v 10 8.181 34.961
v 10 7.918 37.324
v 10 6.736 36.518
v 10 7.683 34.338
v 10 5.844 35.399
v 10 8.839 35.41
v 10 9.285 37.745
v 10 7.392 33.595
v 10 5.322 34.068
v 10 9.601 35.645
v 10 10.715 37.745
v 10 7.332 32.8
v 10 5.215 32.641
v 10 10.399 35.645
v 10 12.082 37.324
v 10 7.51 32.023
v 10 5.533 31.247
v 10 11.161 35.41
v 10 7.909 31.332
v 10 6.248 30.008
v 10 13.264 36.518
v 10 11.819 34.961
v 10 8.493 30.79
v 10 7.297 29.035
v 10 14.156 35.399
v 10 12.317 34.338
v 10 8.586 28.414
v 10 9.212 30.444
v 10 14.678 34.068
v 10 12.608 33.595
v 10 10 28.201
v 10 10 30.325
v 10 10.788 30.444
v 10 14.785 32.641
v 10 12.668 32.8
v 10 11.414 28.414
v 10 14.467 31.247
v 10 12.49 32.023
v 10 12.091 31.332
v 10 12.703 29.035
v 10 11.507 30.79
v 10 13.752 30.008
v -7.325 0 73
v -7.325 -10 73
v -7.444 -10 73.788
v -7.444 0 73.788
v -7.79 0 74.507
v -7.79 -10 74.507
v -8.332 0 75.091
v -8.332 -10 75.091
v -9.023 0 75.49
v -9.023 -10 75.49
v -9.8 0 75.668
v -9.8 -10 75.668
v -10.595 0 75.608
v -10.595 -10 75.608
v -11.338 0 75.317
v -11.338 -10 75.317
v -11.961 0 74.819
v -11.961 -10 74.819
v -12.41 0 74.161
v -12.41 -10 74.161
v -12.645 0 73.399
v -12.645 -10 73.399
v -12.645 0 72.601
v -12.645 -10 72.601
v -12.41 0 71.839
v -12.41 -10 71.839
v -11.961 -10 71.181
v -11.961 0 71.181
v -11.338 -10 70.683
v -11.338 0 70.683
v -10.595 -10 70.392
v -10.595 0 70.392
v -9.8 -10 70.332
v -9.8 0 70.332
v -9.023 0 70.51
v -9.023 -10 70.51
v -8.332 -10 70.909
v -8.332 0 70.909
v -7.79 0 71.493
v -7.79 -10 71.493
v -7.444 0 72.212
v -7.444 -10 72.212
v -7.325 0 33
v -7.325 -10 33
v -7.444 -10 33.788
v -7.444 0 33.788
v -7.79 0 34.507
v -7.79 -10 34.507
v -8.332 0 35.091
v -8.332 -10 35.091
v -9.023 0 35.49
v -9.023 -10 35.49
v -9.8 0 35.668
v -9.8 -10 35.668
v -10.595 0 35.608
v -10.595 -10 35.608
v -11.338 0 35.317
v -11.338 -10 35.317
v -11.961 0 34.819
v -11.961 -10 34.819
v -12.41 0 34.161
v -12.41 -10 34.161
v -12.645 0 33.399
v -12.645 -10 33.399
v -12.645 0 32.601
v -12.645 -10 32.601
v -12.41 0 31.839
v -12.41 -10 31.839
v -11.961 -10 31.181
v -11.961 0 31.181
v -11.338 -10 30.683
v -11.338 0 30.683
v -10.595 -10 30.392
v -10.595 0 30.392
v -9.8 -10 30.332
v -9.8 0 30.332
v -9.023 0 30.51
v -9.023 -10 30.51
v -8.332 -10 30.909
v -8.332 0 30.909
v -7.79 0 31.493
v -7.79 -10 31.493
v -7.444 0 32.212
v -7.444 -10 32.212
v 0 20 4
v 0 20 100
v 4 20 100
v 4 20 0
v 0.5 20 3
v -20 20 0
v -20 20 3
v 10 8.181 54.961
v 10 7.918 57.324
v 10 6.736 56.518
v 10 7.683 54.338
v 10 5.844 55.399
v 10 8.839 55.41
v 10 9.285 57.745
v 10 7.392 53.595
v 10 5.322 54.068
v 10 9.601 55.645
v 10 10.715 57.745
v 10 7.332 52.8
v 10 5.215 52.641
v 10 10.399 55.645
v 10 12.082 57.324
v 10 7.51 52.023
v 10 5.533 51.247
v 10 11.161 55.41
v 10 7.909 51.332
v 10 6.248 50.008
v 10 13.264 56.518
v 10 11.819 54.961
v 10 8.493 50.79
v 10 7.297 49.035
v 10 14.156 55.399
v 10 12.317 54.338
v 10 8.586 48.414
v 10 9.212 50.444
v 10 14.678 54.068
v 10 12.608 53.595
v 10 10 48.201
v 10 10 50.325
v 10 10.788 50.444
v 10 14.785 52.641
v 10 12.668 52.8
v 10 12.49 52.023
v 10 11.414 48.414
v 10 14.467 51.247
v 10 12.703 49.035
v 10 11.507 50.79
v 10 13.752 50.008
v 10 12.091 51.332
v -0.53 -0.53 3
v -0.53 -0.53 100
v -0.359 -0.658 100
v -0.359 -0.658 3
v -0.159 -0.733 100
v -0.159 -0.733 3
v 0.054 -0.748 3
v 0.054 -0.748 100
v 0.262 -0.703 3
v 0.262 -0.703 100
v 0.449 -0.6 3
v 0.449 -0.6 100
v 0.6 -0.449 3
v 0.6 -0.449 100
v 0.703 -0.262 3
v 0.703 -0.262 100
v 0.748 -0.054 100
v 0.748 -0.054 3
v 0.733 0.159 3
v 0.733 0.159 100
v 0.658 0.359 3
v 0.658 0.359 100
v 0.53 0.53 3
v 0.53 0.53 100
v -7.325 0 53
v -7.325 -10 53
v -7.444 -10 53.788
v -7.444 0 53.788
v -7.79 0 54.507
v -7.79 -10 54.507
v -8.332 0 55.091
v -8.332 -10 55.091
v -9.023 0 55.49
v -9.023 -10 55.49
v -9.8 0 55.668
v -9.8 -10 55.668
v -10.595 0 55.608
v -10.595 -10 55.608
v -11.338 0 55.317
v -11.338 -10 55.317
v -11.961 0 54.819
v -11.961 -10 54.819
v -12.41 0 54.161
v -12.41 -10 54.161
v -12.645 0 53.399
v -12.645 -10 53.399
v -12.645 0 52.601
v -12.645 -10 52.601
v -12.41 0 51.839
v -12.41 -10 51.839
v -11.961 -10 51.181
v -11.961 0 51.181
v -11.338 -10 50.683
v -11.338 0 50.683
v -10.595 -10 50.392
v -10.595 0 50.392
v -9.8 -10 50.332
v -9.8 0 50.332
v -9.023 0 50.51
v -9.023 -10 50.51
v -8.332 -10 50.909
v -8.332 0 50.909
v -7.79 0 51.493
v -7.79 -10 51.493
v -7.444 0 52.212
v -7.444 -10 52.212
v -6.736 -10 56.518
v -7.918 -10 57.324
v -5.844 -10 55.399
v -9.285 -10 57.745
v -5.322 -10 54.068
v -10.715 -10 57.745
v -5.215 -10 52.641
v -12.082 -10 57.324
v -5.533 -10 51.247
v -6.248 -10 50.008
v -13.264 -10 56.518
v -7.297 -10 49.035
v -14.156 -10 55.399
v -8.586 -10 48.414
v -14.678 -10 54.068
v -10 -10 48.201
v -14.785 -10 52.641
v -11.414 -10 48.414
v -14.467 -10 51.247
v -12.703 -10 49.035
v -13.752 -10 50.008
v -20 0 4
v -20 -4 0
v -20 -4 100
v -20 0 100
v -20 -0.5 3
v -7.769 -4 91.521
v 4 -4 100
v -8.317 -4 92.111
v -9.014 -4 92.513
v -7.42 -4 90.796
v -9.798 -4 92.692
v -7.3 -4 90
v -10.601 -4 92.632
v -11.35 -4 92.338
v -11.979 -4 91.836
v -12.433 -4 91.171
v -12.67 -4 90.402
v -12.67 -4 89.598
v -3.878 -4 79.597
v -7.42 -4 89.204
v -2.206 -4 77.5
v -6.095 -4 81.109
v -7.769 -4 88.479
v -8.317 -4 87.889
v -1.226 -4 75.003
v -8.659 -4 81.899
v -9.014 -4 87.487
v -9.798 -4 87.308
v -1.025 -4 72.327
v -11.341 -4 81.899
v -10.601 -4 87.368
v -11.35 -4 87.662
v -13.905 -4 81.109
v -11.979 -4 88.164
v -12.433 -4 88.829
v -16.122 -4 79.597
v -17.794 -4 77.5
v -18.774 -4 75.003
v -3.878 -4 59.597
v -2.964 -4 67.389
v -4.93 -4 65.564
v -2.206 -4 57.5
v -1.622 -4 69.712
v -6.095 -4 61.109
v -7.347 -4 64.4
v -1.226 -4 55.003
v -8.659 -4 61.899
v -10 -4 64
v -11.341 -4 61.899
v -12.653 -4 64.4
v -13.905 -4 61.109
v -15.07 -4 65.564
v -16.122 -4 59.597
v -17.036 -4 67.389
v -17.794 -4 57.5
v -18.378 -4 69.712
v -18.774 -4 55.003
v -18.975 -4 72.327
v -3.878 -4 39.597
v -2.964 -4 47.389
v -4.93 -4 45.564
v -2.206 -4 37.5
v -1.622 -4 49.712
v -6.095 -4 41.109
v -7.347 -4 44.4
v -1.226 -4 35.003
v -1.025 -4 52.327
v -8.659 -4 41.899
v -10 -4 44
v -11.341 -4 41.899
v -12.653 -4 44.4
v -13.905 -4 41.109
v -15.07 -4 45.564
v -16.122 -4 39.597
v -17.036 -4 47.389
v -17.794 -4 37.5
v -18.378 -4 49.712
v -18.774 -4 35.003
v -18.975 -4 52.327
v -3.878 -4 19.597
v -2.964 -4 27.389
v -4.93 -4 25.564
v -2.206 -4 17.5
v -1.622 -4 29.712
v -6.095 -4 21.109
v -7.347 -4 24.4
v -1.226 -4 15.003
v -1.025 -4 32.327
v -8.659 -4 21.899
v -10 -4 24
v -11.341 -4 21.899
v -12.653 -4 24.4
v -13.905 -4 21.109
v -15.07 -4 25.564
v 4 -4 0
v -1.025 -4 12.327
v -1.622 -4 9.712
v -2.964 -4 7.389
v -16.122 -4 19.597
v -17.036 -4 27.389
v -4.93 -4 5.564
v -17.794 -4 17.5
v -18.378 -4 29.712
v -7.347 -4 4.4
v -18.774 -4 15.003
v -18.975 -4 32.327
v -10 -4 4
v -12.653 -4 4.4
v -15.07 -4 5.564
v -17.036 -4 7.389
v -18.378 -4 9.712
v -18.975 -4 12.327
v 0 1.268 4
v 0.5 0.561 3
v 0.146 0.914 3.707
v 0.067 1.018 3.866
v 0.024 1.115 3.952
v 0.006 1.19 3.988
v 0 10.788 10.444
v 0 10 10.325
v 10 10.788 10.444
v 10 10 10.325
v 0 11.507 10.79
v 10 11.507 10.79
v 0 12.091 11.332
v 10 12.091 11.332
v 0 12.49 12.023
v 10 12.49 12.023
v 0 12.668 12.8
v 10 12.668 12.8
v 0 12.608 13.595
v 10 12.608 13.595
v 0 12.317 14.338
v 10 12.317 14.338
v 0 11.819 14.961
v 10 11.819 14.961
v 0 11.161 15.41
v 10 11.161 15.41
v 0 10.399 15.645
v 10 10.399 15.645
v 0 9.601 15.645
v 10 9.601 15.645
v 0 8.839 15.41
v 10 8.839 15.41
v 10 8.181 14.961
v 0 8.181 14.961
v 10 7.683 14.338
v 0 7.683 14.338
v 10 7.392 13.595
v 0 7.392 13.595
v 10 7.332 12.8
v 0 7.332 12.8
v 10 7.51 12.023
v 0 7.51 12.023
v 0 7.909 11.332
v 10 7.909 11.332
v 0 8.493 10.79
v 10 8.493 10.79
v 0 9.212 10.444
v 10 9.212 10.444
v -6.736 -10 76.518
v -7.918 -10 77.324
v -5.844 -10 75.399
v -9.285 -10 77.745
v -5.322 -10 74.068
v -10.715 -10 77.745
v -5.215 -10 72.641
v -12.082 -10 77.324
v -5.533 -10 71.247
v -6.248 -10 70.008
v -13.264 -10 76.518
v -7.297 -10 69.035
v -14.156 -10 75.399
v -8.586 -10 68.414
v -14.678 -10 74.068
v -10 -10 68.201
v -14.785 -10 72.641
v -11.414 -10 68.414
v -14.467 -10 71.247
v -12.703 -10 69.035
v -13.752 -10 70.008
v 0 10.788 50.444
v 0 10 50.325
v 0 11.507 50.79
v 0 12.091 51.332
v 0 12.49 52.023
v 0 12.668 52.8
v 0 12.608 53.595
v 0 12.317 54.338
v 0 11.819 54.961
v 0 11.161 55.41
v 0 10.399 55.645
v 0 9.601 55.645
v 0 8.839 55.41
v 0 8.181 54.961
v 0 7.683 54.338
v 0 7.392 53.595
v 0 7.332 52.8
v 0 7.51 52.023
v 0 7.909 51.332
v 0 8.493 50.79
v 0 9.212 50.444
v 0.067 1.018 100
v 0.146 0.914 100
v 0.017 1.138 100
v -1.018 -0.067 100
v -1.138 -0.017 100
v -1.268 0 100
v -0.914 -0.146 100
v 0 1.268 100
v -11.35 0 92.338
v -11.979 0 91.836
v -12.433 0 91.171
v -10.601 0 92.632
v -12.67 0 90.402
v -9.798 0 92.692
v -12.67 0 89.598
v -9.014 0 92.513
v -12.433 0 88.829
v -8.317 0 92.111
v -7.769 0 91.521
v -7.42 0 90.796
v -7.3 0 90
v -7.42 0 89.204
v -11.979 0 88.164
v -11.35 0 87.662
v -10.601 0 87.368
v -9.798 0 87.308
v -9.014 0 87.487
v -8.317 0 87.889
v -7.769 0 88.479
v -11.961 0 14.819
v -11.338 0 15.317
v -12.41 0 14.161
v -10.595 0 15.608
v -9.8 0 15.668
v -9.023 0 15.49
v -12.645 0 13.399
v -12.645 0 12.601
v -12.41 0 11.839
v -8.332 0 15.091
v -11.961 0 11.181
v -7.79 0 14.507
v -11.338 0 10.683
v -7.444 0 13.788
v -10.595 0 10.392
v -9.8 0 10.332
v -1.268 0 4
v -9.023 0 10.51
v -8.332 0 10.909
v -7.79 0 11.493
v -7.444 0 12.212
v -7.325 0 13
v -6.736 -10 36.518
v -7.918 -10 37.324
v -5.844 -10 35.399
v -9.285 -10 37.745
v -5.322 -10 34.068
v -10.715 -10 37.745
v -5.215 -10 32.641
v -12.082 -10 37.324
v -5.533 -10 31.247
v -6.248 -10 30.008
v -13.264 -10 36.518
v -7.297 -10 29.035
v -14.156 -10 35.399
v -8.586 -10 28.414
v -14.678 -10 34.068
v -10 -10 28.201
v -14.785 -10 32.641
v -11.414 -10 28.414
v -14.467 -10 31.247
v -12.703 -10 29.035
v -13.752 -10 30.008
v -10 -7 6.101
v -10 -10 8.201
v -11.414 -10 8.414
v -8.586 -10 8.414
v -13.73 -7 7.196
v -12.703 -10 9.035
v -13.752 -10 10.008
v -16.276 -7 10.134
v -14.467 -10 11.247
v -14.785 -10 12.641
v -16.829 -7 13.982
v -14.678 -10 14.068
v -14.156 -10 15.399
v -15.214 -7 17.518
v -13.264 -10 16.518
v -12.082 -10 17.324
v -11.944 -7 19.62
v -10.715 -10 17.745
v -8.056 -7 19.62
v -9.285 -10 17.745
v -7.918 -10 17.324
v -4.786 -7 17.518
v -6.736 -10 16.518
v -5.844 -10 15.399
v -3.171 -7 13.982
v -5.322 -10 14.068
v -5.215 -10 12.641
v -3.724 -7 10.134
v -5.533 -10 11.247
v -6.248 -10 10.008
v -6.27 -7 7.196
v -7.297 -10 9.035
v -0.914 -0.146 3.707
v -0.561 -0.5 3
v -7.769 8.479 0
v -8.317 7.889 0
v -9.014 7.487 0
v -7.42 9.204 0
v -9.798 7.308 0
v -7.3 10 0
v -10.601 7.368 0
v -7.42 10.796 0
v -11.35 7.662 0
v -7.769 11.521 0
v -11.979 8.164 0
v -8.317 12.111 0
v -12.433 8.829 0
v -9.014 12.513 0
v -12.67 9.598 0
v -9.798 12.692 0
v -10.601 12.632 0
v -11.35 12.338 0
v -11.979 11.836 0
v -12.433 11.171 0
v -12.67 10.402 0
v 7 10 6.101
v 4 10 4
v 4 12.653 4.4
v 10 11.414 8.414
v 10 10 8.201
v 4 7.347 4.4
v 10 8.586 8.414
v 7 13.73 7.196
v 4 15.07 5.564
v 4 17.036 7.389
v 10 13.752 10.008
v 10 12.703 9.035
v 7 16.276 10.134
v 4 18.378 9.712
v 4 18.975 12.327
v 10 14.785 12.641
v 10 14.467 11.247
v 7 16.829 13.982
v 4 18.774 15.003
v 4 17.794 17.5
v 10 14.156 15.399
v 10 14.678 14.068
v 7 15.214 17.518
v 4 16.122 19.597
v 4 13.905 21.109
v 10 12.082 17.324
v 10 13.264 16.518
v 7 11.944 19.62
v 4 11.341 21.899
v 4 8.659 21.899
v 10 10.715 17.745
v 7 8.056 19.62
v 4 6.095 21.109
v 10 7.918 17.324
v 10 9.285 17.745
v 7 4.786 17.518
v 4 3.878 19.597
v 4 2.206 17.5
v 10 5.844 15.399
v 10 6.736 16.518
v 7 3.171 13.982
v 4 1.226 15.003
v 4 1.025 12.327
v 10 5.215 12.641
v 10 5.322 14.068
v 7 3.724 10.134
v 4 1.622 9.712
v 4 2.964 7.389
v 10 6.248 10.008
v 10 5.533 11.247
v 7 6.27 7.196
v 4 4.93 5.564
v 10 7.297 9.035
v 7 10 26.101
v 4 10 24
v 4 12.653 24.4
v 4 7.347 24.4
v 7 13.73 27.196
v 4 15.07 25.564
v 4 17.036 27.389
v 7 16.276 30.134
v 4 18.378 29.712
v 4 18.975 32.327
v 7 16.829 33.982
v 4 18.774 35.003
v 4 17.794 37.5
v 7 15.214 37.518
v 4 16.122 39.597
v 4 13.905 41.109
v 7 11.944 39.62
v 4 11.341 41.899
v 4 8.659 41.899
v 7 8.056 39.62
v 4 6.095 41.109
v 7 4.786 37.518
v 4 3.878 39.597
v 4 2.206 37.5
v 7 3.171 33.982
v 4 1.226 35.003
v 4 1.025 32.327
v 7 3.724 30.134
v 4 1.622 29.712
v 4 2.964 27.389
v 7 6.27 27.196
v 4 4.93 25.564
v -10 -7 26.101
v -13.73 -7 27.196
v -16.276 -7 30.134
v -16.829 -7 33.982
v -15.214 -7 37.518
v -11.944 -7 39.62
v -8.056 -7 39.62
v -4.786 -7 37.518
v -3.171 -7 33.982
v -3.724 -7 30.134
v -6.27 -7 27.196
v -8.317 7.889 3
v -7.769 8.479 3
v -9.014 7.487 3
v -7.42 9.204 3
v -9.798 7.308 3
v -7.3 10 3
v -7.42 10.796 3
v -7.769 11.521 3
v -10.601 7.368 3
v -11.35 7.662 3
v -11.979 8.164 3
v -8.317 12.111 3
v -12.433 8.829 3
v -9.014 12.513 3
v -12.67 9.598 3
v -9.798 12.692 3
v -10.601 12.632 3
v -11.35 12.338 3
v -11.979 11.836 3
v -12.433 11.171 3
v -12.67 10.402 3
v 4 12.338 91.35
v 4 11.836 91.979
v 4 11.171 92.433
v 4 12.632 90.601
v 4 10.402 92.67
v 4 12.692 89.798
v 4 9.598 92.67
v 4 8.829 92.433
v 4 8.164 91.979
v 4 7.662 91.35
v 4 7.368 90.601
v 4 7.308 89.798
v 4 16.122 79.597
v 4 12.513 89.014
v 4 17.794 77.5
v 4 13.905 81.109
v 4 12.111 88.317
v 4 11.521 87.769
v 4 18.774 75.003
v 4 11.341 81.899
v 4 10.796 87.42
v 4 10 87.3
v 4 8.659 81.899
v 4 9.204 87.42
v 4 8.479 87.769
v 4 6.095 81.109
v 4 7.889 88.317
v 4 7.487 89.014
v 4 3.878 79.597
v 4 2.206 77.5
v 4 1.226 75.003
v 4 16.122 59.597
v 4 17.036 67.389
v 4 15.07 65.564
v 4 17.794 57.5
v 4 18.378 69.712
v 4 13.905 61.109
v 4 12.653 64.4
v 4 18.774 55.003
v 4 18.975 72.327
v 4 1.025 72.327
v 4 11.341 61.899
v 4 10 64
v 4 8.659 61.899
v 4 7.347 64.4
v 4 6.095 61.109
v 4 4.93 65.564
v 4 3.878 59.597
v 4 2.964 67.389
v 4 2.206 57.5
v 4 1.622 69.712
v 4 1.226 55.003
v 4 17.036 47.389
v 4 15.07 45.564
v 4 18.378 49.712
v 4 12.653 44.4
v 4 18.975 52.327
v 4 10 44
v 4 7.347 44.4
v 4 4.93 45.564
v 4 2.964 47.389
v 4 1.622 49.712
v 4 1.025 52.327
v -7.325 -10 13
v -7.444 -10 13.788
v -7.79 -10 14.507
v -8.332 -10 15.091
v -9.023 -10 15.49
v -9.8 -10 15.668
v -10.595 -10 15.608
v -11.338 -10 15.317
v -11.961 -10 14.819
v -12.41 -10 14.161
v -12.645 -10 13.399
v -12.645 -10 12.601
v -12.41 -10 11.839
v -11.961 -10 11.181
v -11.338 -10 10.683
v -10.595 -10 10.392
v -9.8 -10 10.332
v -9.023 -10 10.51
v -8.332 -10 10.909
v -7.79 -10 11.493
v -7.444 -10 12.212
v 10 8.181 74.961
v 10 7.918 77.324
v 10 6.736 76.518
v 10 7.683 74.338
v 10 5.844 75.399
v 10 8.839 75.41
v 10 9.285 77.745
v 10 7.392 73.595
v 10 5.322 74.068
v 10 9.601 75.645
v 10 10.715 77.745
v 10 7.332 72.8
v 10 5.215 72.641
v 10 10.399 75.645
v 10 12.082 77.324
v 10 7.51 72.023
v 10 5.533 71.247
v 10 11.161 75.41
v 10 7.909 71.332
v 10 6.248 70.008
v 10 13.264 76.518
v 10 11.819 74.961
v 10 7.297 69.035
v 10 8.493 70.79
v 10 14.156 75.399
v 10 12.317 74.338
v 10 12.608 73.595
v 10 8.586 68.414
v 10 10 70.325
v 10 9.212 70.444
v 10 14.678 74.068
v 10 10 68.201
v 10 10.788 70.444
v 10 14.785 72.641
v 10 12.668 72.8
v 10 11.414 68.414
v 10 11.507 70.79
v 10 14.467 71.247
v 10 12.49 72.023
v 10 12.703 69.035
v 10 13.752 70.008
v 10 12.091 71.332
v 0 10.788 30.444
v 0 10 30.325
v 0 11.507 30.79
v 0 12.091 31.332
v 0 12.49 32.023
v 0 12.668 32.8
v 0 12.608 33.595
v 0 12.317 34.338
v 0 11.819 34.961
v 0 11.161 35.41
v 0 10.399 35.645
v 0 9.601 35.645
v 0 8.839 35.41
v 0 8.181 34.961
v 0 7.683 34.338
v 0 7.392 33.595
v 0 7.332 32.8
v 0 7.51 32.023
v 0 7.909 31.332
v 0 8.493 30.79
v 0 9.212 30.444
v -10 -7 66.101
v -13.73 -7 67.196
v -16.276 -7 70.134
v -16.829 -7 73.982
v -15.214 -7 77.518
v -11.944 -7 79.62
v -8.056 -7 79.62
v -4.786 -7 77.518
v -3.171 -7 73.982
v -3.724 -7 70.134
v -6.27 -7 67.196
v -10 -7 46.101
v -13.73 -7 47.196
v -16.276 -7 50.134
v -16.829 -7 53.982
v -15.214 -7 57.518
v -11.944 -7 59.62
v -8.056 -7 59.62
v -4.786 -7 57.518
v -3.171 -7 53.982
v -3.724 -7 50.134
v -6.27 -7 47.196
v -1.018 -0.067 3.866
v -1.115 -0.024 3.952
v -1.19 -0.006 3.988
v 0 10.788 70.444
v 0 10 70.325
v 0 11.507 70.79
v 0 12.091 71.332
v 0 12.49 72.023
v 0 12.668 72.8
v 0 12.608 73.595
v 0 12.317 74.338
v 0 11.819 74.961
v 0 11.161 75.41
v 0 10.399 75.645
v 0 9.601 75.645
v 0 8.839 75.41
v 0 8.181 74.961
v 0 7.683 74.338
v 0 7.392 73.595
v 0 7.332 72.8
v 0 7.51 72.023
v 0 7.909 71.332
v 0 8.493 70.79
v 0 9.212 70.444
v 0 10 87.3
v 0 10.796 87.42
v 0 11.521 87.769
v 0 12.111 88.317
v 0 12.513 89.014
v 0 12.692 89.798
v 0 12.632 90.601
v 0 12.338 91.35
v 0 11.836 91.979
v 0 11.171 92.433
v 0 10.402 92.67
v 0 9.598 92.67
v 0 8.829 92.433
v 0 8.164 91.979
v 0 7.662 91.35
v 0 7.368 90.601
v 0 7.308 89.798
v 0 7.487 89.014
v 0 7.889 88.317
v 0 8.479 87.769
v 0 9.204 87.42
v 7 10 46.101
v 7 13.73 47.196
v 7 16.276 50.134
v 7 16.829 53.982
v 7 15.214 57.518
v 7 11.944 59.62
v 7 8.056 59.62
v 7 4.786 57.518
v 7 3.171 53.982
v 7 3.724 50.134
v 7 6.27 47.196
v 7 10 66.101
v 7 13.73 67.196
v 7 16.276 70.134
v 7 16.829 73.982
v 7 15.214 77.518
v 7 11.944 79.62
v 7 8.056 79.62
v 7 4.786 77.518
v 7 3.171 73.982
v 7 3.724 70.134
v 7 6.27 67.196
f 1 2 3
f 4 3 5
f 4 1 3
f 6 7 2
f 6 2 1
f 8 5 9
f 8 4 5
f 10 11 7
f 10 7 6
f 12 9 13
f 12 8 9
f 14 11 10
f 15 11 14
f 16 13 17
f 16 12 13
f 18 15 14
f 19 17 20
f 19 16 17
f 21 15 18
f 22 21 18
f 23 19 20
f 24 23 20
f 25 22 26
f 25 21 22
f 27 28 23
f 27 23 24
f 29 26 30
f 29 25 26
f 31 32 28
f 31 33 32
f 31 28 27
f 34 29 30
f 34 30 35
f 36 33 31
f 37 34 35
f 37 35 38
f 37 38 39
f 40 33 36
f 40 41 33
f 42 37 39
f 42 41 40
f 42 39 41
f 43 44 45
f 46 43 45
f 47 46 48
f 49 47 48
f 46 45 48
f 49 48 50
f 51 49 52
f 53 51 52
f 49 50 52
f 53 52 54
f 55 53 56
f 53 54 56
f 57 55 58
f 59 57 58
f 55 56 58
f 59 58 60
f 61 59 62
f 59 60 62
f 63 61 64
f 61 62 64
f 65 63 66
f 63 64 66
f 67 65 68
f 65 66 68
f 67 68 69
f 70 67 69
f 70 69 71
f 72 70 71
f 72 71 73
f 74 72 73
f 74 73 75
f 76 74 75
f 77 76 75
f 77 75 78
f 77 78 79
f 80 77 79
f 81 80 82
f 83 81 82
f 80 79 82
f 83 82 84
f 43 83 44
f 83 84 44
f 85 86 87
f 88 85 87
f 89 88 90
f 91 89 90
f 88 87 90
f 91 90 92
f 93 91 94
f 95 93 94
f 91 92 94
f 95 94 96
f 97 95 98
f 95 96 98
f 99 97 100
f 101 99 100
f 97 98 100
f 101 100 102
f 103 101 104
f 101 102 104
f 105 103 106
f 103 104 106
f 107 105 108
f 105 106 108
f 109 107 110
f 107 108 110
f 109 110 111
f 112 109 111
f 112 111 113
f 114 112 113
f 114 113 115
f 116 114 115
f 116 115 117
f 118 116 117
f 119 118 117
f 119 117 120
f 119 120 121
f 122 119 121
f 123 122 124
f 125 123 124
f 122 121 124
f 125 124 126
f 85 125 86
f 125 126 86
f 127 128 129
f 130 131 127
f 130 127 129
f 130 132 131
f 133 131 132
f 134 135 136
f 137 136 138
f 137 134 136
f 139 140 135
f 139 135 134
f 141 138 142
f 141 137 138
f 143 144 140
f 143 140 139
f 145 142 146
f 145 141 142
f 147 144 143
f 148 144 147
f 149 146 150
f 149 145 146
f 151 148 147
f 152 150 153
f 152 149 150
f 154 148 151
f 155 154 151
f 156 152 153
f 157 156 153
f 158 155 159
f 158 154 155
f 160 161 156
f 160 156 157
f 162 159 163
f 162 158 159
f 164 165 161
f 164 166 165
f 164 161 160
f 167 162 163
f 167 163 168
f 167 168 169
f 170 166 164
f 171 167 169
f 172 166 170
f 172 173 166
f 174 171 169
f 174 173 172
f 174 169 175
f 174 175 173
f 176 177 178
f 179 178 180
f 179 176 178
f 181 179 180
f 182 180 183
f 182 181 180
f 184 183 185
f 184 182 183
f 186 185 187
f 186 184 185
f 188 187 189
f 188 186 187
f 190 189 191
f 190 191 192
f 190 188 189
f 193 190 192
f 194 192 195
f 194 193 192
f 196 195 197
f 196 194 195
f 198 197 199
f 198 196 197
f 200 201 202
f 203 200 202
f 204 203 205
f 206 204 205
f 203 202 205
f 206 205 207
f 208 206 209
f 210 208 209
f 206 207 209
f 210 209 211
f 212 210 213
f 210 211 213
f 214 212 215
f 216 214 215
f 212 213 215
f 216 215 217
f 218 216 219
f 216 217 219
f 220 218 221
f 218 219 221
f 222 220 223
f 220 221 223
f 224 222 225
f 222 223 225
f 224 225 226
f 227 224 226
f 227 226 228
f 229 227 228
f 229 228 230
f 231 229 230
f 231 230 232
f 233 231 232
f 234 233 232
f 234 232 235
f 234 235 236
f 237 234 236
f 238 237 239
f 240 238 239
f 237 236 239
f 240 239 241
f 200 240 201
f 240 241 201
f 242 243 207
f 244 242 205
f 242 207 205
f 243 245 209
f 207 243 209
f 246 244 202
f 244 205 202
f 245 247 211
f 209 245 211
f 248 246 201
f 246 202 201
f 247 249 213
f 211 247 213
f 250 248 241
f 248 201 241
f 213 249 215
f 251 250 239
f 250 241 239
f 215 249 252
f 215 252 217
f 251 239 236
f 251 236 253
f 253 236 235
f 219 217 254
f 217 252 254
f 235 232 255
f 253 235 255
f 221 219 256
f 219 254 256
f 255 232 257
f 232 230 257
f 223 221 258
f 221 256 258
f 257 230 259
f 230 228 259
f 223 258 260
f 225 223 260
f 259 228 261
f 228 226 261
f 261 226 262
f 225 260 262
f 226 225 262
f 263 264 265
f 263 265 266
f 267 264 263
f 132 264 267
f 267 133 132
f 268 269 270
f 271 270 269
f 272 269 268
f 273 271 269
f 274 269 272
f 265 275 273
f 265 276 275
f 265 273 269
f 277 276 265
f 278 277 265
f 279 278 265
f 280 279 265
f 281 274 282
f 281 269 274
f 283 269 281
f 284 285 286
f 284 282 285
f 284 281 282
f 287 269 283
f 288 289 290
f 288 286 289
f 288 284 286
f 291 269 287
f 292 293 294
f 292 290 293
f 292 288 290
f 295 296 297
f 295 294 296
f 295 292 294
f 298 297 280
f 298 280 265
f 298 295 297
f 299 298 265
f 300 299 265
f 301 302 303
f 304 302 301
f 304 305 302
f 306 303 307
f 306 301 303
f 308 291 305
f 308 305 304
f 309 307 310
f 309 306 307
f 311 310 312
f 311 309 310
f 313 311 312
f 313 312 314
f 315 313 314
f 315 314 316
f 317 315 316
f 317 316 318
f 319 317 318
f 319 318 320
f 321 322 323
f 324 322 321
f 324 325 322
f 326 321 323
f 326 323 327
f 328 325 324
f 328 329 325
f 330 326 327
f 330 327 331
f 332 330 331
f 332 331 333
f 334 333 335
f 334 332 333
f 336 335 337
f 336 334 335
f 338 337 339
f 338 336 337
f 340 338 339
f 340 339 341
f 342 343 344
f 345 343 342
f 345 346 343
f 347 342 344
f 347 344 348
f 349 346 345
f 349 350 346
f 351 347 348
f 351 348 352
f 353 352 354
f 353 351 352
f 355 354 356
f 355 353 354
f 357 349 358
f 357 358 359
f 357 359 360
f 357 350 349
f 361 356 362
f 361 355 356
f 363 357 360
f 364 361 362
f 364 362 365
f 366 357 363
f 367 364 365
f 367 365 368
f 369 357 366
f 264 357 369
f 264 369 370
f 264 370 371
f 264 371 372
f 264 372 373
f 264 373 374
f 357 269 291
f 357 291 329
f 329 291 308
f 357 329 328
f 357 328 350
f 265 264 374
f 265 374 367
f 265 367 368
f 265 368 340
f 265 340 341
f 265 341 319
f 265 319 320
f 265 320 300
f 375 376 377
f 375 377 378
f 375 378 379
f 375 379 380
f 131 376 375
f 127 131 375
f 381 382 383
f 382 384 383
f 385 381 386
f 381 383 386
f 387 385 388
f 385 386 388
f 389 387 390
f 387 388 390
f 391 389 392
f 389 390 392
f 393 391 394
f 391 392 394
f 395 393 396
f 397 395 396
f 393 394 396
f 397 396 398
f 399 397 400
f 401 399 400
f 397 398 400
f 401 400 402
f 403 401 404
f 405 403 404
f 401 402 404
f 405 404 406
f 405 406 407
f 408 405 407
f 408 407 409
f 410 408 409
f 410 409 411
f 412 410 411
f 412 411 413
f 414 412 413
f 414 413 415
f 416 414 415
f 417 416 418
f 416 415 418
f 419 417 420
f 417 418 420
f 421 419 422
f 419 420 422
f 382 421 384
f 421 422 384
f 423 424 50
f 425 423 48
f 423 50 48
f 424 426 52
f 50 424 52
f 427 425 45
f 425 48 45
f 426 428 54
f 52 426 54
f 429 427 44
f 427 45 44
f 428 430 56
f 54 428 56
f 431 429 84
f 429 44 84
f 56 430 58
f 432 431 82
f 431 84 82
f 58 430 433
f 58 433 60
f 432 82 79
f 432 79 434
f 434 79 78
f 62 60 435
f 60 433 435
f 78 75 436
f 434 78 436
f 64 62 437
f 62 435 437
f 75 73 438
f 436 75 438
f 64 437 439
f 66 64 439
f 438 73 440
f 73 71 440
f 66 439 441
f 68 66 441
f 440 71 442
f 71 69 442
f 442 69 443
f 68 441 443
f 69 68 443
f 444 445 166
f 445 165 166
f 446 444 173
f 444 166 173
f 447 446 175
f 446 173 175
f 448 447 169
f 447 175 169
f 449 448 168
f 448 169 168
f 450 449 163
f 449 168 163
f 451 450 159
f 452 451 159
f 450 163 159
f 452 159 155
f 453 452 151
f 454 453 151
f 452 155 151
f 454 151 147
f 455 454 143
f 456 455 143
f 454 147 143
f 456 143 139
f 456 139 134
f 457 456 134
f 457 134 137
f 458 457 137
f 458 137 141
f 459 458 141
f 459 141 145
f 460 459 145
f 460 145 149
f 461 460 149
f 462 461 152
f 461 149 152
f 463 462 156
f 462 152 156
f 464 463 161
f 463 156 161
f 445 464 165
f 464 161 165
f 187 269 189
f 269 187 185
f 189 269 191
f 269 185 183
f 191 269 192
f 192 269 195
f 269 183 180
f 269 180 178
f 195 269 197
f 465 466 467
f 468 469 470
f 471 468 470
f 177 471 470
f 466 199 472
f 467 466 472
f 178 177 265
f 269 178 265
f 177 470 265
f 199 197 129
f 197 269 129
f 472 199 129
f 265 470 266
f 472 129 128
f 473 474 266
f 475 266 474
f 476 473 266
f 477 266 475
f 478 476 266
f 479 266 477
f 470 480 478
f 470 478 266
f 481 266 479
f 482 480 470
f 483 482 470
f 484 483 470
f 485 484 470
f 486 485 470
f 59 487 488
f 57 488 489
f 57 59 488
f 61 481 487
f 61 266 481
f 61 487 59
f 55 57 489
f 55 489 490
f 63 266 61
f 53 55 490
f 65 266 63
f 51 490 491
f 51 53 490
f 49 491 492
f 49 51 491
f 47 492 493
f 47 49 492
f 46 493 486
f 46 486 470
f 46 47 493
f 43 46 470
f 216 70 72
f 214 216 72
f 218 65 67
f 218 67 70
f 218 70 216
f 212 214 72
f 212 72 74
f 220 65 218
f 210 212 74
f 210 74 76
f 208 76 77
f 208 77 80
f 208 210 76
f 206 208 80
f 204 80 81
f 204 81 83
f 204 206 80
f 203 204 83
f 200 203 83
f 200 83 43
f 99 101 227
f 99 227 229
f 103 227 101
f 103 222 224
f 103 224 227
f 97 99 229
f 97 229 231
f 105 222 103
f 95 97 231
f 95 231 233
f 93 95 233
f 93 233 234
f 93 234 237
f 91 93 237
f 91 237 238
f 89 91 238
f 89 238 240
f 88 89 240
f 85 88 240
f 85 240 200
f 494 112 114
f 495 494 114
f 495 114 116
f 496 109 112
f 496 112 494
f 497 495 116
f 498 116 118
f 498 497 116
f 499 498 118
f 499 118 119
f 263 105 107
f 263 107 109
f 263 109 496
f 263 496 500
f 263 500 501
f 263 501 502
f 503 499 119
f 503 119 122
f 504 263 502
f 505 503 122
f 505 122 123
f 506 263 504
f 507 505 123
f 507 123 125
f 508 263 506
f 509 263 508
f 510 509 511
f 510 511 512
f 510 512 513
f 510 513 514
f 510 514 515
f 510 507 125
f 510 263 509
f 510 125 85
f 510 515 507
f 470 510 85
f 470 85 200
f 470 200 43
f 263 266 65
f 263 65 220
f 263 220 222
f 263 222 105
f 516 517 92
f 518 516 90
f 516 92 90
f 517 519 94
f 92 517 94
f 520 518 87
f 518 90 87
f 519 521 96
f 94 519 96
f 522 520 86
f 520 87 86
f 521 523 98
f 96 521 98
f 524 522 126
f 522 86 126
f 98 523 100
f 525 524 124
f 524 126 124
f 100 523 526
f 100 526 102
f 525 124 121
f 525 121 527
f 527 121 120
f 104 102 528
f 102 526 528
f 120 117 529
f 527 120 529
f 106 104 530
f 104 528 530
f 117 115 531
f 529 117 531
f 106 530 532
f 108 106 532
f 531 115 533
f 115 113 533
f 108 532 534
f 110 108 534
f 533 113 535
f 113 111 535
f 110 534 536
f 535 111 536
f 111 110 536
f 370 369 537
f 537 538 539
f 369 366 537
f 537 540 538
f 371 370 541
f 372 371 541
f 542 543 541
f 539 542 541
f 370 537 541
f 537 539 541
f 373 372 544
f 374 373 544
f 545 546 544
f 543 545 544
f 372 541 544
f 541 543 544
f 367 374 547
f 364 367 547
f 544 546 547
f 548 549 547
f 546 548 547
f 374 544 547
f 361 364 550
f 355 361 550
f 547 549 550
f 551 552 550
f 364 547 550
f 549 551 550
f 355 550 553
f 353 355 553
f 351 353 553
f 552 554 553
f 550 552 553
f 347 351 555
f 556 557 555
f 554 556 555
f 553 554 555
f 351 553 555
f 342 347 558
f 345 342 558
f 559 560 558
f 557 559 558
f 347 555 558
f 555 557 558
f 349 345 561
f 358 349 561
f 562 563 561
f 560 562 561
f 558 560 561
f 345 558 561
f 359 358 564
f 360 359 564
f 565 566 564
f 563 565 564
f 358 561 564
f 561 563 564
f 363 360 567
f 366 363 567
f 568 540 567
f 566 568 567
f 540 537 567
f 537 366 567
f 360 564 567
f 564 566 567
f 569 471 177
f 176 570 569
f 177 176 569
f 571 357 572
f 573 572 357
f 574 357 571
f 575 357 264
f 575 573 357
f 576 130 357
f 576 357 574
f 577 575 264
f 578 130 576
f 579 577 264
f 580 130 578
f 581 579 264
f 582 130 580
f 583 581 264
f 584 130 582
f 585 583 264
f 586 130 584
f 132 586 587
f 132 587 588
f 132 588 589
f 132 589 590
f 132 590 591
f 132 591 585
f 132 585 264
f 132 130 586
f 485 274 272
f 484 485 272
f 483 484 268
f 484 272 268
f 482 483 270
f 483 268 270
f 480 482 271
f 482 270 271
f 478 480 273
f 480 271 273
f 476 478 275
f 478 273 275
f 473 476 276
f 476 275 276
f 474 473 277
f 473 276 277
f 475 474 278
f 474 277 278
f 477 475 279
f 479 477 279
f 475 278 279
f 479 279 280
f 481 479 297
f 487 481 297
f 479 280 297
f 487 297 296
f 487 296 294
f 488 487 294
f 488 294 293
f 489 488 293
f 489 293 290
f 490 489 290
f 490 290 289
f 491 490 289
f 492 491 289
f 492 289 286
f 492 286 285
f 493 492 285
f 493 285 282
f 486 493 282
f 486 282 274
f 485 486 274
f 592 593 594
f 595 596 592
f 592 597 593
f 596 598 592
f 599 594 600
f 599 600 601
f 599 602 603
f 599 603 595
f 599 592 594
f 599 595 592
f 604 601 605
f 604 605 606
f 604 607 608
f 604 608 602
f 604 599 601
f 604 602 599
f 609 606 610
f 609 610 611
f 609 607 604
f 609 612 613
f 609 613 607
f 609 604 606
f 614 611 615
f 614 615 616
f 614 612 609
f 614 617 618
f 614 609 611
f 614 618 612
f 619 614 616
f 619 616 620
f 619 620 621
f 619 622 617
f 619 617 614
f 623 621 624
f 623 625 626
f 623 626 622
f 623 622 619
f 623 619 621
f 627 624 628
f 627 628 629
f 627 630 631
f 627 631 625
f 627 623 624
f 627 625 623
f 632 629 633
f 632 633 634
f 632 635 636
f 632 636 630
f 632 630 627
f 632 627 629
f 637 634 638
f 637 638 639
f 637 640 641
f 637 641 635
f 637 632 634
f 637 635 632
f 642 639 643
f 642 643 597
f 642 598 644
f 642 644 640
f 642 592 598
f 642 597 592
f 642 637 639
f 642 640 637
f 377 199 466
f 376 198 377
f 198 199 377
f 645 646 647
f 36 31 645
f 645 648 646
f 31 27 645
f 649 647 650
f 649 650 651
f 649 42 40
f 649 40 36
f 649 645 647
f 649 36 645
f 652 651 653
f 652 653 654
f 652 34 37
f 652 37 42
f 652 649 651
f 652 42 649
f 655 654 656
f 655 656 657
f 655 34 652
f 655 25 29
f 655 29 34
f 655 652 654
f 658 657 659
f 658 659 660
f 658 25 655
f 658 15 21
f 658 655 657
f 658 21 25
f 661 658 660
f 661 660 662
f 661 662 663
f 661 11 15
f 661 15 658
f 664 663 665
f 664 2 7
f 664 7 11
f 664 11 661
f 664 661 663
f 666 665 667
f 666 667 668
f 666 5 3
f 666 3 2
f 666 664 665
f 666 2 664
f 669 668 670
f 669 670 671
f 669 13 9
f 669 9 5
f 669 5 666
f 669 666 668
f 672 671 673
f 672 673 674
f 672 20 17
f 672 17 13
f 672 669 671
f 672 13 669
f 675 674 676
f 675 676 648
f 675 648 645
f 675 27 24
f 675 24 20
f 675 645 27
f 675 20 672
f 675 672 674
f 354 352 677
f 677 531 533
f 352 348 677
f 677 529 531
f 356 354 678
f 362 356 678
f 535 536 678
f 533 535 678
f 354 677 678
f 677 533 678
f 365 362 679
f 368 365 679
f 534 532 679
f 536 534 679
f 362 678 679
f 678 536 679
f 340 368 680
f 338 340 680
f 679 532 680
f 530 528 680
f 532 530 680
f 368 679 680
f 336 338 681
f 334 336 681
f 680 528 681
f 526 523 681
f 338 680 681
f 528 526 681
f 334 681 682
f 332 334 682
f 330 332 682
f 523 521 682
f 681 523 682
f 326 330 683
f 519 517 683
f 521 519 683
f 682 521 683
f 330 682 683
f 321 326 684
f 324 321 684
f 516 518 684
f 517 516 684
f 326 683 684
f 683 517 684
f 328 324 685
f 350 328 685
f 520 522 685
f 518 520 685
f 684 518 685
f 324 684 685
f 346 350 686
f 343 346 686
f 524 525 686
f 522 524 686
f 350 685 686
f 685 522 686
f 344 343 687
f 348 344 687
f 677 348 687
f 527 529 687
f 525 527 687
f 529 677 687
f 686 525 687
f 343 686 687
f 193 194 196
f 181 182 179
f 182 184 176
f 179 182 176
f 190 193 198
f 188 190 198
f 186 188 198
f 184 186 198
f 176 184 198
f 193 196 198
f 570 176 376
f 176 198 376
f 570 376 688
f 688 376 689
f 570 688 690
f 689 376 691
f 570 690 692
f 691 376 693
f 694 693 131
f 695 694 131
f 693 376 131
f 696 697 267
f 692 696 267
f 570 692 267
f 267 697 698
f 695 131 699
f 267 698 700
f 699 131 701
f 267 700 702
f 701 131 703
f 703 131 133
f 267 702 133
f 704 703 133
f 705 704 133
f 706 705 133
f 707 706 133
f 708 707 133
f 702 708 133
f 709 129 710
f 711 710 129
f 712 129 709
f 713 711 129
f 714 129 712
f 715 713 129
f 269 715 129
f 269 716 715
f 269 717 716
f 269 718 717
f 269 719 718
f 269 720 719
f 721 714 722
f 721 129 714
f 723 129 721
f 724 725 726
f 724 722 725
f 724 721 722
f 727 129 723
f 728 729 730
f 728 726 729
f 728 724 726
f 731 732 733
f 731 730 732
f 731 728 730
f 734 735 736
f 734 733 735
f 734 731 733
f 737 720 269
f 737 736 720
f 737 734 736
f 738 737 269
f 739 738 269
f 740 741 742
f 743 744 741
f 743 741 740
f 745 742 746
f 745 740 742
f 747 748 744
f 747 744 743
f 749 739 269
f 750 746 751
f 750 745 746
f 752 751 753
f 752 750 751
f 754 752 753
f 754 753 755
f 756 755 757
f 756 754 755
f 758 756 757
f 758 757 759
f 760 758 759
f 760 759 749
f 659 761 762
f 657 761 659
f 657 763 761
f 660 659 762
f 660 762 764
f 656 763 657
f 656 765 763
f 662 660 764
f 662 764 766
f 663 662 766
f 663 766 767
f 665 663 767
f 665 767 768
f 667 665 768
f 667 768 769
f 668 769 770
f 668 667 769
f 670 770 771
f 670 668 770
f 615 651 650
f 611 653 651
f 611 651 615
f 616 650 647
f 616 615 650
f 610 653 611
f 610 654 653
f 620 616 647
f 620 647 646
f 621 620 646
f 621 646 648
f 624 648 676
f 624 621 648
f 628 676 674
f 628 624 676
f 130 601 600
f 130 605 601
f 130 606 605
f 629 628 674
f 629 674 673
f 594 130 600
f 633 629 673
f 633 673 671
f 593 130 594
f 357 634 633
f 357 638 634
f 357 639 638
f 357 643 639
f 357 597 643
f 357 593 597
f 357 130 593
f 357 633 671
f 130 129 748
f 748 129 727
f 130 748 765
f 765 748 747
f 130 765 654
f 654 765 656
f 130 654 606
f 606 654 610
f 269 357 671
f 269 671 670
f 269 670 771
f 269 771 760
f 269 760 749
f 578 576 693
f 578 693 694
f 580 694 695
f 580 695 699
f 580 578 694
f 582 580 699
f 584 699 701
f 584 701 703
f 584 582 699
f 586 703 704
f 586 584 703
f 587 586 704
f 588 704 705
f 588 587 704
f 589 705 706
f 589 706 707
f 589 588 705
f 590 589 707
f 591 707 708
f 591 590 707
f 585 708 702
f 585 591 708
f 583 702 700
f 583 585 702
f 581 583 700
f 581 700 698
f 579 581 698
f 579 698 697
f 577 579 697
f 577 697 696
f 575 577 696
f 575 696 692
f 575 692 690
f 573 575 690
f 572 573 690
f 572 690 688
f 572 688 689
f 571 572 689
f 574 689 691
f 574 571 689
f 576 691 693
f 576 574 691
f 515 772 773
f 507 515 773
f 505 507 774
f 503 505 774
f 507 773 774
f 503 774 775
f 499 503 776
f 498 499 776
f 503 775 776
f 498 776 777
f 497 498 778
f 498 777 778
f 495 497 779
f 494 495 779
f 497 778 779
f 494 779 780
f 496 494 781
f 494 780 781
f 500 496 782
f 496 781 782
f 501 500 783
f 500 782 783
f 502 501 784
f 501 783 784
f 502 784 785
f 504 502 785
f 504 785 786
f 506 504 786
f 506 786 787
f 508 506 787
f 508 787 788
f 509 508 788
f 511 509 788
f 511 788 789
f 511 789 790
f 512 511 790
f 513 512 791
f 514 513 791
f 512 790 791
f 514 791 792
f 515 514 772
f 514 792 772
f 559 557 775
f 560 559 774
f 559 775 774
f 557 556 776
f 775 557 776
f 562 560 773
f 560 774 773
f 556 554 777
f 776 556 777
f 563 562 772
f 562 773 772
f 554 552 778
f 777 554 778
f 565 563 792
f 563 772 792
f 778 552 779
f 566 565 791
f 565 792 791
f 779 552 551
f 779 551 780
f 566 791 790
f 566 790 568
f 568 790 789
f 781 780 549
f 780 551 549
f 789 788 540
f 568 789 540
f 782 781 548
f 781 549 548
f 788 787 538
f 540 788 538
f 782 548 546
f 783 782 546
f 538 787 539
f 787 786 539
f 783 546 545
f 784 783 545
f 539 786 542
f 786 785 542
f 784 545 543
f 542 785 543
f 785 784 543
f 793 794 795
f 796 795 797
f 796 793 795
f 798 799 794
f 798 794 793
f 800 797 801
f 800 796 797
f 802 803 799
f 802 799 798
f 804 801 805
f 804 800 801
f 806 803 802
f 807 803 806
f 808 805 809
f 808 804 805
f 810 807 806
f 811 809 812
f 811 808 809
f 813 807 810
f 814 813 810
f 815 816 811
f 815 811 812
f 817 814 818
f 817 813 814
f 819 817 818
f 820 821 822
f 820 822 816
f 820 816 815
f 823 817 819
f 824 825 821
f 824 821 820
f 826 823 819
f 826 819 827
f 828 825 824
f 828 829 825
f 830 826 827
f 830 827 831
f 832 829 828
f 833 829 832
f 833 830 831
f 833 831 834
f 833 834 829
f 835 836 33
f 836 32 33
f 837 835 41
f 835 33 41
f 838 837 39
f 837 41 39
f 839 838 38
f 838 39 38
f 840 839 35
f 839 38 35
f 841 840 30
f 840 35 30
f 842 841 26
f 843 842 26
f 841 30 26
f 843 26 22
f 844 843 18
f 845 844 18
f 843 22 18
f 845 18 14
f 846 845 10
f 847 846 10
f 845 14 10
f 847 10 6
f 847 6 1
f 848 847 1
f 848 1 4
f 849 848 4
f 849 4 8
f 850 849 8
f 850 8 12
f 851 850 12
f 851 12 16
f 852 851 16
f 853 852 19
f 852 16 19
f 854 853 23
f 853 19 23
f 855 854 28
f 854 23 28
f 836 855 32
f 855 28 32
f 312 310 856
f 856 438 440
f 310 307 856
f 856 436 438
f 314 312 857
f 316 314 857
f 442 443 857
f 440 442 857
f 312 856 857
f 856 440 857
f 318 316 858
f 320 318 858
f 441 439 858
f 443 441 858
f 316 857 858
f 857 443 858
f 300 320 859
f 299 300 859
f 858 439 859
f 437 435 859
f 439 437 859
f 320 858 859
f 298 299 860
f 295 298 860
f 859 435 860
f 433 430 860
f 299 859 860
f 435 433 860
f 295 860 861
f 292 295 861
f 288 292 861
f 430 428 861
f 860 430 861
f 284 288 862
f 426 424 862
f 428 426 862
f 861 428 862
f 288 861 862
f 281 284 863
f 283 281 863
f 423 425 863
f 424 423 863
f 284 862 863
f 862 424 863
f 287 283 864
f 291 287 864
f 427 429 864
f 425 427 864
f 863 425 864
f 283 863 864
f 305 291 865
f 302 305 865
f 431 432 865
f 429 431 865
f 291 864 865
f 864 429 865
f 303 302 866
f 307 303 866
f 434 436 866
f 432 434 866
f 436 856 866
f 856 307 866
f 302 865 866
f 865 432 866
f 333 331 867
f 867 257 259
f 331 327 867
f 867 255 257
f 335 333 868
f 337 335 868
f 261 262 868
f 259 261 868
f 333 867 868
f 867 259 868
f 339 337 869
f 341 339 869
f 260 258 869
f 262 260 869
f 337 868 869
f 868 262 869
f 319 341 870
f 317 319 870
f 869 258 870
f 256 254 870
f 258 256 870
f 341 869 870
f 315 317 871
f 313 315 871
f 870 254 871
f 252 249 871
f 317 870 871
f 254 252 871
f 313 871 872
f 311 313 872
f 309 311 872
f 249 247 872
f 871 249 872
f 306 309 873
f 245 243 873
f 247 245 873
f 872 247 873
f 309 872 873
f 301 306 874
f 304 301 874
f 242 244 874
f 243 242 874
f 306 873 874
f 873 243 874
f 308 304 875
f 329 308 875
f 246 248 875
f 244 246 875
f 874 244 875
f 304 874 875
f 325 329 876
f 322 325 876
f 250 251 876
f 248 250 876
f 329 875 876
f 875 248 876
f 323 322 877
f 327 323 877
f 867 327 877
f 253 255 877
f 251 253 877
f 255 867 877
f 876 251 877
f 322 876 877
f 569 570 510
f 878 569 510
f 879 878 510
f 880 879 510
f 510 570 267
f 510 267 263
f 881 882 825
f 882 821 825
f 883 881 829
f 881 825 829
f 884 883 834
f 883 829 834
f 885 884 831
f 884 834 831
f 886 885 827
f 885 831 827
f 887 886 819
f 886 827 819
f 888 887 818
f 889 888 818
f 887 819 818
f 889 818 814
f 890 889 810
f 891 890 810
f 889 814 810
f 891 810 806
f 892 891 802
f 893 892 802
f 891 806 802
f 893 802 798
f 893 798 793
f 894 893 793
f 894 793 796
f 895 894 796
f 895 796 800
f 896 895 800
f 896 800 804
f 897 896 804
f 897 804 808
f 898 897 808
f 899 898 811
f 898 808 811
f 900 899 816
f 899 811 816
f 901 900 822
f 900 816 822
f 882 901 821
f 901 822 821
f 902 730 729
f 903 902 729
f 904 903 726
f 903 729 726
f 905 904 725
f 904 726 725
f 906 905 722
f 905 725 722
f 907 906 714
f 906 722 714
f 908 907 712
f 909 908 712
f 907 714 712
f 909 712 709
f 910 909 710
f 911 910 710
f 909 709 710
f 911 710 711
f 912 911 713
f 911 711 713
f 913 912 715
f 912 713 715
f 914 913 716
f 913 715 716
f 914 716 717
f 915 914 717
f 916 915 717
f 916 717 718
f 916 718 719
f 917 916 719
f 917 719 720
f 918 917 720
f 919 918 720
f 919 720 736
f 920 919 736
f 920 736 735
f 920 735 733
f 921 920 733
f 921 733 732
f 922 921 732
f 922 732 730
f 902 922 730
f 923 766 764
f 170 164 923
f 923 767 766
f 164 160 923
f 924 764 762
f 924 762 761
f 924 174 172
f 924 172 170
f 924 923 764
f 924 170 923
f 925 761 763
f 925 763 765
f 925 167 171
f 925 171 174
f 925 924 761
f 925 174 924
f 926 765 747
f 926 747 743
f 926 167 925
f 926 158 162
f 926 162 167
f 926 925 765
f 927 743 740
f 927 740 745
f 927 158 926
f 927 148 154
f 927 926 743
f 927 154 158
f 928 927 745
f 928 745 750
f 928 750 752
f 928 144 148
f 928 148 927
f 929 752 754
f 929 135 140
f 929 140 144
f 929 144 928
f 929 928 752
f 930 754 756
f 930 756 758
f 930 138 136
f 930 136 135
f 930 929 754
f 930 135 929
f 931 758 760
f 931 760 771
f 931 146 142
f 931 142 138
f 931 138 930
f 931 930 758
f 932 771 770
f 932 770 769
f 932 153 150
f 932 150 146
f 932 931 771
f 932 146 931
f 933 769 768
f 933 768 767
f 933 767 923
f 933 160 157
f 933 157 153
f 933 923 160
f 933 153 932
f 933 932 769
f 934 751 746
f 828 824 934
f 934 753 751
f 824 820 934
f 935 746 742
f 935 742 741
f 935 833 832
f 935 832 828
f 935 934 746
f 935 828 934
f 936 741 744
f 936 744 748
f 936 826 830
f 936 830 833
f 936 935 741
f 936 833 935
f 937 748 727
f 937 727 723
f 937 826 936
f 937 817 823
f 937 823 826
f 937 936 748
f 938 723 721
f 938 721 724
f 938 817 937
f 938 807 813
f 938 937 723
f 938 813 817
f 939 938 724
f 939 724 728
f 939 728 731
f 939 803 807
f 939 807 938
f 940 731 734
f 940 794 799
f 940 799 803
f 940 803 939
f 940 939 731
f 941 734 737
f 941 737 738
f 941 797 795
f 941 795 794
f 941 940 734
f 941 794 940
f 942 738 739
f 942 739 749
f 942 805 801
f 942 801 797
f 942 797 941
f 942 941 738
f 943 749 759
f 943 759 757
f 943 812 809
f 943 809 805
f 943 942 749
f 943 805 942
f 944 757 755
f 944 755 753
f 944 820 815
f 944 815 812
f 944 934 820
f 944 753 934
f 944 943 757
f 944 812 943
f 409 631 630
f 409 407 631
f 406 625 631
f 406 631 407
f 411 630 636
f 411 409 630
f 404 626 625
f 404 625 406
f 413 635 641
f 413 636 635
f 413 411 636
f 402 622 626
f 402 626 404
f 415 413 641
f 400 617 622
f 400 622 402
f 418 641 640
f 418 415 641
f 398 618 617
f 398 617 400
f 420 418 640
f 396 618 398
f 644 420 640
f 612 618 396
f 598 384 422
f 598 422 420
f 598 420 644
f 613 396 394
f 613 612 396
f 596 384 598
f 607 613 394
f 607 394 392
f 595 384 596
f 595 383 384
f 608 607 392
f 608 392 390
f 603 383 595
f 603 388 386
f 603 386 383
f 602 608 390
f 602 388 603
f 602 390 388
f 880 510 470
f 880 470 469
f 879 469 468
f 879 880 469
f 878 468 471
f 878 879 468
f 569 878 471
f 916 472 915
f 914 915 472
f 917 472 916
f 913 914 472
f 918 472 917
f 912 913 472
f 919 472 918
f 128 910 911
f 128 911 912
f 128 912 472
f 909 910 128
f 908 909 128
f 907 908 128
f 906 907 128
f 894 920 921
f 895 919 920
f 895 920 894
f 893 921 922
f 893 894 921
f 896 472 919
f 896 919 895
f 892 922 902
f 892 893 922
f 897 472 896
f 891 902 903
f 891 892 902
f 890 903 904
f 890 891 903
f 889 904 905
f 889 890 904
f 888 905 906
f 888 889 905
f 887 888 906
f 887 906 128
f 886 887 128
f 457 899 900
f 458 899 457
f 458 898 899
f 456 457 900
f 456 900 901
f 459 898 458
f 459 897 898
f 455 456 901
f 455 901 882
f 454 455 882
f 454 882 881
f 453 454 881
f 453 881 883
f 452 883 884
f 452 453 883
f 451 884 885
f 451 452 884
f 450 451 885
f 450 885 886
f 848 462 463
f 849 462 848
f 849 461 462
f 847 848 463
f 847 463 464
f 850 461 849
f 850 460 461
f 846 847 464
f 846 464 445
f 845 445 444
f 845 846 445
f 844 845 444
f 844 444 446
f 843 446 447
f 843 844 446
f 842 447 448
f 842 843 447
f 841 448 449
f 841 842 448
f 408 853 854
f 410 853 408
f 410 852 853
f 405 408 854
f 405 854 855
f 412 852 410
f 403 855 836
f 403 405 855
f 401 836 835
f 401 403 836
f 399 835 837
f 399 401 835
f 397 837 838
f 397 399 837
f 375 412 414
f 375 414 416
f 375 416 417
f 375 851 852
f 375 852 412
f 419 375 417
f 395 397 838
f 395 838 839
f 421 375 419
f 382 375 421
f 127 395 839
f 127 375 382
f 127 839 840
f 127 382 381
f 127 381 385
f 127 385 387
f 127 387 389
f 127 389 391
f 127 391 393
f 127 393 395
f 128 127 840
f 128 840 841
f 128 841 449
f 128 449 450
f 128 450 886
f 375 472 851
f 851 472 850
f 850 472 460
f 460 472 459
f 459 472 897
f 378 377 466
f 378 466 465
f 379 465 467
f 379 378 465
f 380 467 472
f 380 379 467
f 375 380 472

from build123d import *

# Parameters (mm, degrees)
SKETCH1_R                      = 2.7
BOSS_EXTRUDE1_DEPTH            = 3
BOSS_EXTRUDE2_DEPTH            = 100
CUT_EXTRUDE1_DEPTH             = 20
CUT_EXTRUDE2_DEPTH             = 20
SKETCH4_R                      = 9
BOSS_EXTRUDE3_DEPTH            = 6
BOSS_EXTRUDE3_TAPER            = 35
CUT_EXTRUDE3_REACH             = 26
SKETCH4_3_R                    = 2.675
SKETCH4_3_R_2                  = 2.7
CUT_EXTRUDE3_DIRECTION_2_REACH = 8
SKETCH5_R                      = 2.675
SKETCH5_R_2                    = 2.7
CUT_EXTRUDE4_DEPTH             = 10


with BuildPart() as part:
    # Sketch1 → Boss-Extrude1 (new body)
    with BuildSketch(Plane.XY):
        with BuildLine():
            Line((-1.267766953, 0), (-20, 0))
            Line((-20, 0), (-20, 20))
            Line((-20, 20), (0, 20))
            Line((0, 20), (0, 1.267766953))
            ThreePointArc((0, 1.267766953), (0.038060234, 1.076425237), (0.146446609, 0.914213562))
            Line((0.146446609, 0.914213562), (0.530330086, 0.530330086))
            ThreePointArc((0.530330086, 0.530330086), (0.530330086, -0.530330086), (-0.530330086, -0.530330086))
            Line((-0.530330086, -0.530330086), (-0.914213562, -0.146446609))
            ThreePointArc((-0.914213562, -0.146446609), (-1.076425237, -0.038060234), (-1.267766953, 0))
        make_face()
        with Locations((-10, 10)):
            Circle(SKETCH1_R, mode=Mode.SUBTRACT)
    extrude(amount=BOSS_EXTRUDE1_DEPTH)

    # Sketch1<4> → Boss-Extrude2 (add)
    with BuildSketch(Plane.XY):
        with BuildLine():
            ThreePointArc((-1.267766953, 0), (-1.076425237, -0.038060234), (-0.914213562, -0.146446609))
            Line((-0.914213562, -0.146446609), (-0.530330086, -0.530330086))
            ThreePointArc((-0.530330086, -0.530330086), (0.530330086, -0.530330086), (0.530330086, 0.530330086))
            Line((0.530330086, 0.530330086), (0.146446609, 0.914213562))
            ThreePointArc((0.146446609, 0.914213562), (0.038060234, 1.076425237), (0, 1.267766953))
            Line((0, 1.267766953), (0, 20))
            Line((0, 20), (4, 20))
            Line((4, 20), (4, -4))
            Line((4, -4), (-20, -4))
            Line((-20, -4), (-20, 0))
            Line((-20, 0), (-1.267766953, 0))
        make_face()
    extrude(amount=BOSS_EXTRUDE2_DEPTH)

    # Sketch2 → Cut-Extrude1 (cut)
    with BuildSketch(Plane(origin=(0, 20, 0), x_dir=(1, 0, 0), z_dir=(0, 1, 0))):
        Polygon((0, -3), (0.5, -3), (0, -4), align=None)
    extrude(amount=-CUT_EXTRUDE1_DEPTH, mode=Mode.SUBTRACT)

    # Sketch3 → Cut-Extrude2 (cut)
    with BuildSketch(Plane.ZY.offset(20)):
        Polygon((3, 0), (3, -0.5), (4, 0), align=None)
    extrude(amount=-CUT_EXTRUDE2_DEPTH, mode=Mode.SUBTRACT)

    # Sketch4 → Boss-Extrude3 (add)
    with BuildSketch(Plane(origin=(4, 0, 0), x_dir=(0, 0, -1), z_dir=(1, 0, 0))):
        with Locations((-13, 10)):
            Circle(SKETCH4_R)
        with Locations((-33, 10)):
            Circle(SKETCH4_R)
        with Locations((-53, 10)):
            Circle(SKETCH4_R)
        with Locations((-73, 10)):
            Circle(SKETCH4_R)
    boss_extrude3 = extrude(amount=BOSS_EXTRUDE3_DEPTH, taper=BOSS_EXTRUDE3_TAPER)

    # Cut-Extrude3: up to this face of the body (flat: up to its plane)
    cut_extrude3_end = Plane(part.part.faces().sort_by_distance((0, 10.633883476, 52))[0])
    # Sketch4<3> → Cut-Extrude3 (cut, up to the picked face)
    with BuildSketch(Plane(origin=(4, 0, 0), x_dir=(0, 0, -1), z_dir=(1, 0, 0)), mode=Mode.PRIVATE) as cut_extrude3_sk1:
        with Locations((-13, 10)):
            Circle(SKETCH4_3_R)
    cut_extrude3_tool1 = split(extrude(cut_extrude3_sk1.sketch, amount=-CUT_EXTRUDE3_REACH, mode=Mode.PRIVATE), bisect_by=cut_extrude3_end, keep=Keep.BOTH, mode=Mode.PRIVATE)
    add(cut_extrude3_tool1.solids().sort_by_distance((4, 10, 13))[0], mode=Mode.SUBTRACT)
    # Sketch4<3> → Cut-Extrude3 (cut, up to the picked face)
    with BuildSketch(Plane(origin=(4, 0, 0), x_dir=(0, 0, -1), z_dir=(1, 0, 0)), mode=Mode.PRIVATE) as cut_extrude3_sk2:
        with Locations((-33, 10)):
            Circle(SKETCH4_3_R)
    cut_extrude3_tool2 = split(extrude(cut_extrude3_sk2.sketch, amount=-CUT_EXTRUDE3_REACH, mode=Mode.PRIVATE), bisect_by=cut_extrude3_end, keep=Keep.BOTH, mode=Mode.PRIVATE)
    add(cut_extrude3_tool2.solids().sort_by_distance((4, 10, 33))[0], mode=Mode.SUBTRACT)
    # Sketch4<3> → Cut-Extrude3 (cut, up to the picked face)
    with BuildSketch(Plane(origin=(4, 0, 0), x_dir=(0, 0, -1), z_dir=(1, 0, 0)), mode=Mode.PRIVATE) as cut_extrude3_sk3:
        with Locations((-53, 10)):
            Circle(SKETCH4_3_R)
    cut_extrude3_tool3 = split(extrude(cut_extrude3_sk3.sketch, amount=-CUT_EXTRUDE3_REACH, mode=Mode.PRIVATE), bisect_by=cut_extrude3_end, keep=Keep.BOTH, mode=Mode.PRIVATE)
    add(cut_extrude3_tool3.solids().sort_by_distance((4, 10, 53))[0], mode=Mode.SUBTRACT)
    # Sketch4<3> → Cut-Extrude3 (cut, up to the picked face)
    with BuildSketch(Plane(origin=(4, 0, 0), x_dir=(0, 0, -1), z_dir=(1, 0, 0)), mode=Mode.PRIVATE) as cut_extrude3_sk4:
        with Locations((-73, 10)):
            Circle(SKETCH4_3_R)
    cut_extrude3_tool4 = split(extrude(cut_extrude3_sk4.sketch, amount=-CUT_EXTRUDE3_REACH, mode=Mode.PRIVATE), bisect_by=cut_extrude3_end, keep=Keep.BOTH, mode=Mode.PRIVATE)
    add(cut_extrude3_tool4.solids().sort_by_distance((4, 10, 73))[0], mode=Mode.SUBTRACT)
    # Sketch4<3> → Cut-Extrude3 (cut, up to the picked face)
    with BuildSketch(Plane(origin=(4, 0, 0), x_dir=(0, 0, -1), z_dir=(1, 0, 0)), mode=Mode.PRIVATE) as cut_extrude3_sk5:
        with Locations((-90, 10)):
            Circle(SKETCH4_3_R_2)
    cut_extrude3_tool5 = split(extrude(cut_extrude3_sk5.sketch, amount=-CUT_EXTRUDE3_REACH, mode=Mode.PRIVATE), bisect_by=cut_extrude3_end, keep=Keep.BOTH, mode=Mode.PRIVATE)
    add(cut_extrude3_tool5.solids().sort_by_distance((4, 10, 90))[0], mode=Mode.SUBTRACT)

    # Cut-Extrude3 direction 2: up to this face of the body (flat: up to its plane)
    cut_extrude3_direction_2_end = Plane(part.part.faces().sort_by_distance((10, 10, 73))[0])
    # Sketch4<3> → Cut-Extrude3 direction 2 (cut, up to the picked face)
    with BuildSketch(Plane(origin=(4, 0, 0), x_dir=(0, 0, -1), z_dir=(1, 0, 0)), mode=Mode.PRIVATE) as cut_extrude3_direction_2_sk1:
        with Locations((-13, 10)):
            Circle(SKETCH4_3_R)
    cut_extrude3_direction_2_tool1 = split(extrude(cut_extrude3_direction_2_sk1.sketch, amount=CUT_EXTRUDE3_DIRECTION_2_REACH, mode=Mode.PRIVATE), bisect_by=cut_extrude3_direction_2_end, keep=Keep.BOTH, mode=Mode.PRIVATE)
    add(cut_extrude3_direction_2_tool1.solids().sort_by_distance((4, 10, 13))[0], mode=Mode.SUBTRACT)
    # Sketch4<3> → Cut-Extrude3 direction 2 (cut, up to the picked face)
    with BuildSketch(Plane(origin=(4, 0, 0), x_dir=(0, 0, -1), z_dir=(1, 0, 0)), mode=Mode.PRIVATE) as cut_extrude3_direction_2_sk2:
        with Locations((-33, 10)):
            Circle(SKETCH4_3_R)
    cut_extrude3_direction_2_tool2 = split(extrude(cut_extrude3_direction_2_sk2.sketch, amount=CUT_EXTRUDE3_DIRECTION_2_REACH, mode=Mode.PRIVATE), bisect_by=cut_extrude3_direction_2_end, keep=Keep.BOTH, mode=Mode.PRIVATE)
    add(cut_extrude3_direction_2_tool2.solids().sort_by_distance((4, 10, 33))[0], mode=Mode.SUBTRACT)
    # Sketch4<3> → Cut-Extrude3 direction 2 (cut, up to the picked face)
    with BuildSketch(Plane(origin=(4, 0, 0), x_dir=(0, 0, -1), z_dir=(1, 0, 0)), mode=Mode.PRIVATE) as cut_extrude3_direction_2_sk3:
        with Locations((-53, 10)):
            Circle(SKETCH4_3_R)
    cut_extrude3_direction_2_tool3 = split(extrude(cut_extrude3_direction_2_sk3.sketch, amount=CUT_EXTRUDE3_DIRECTION_2_REACH, mode=Mode.PRIVATE), bisect_by=cut_extrude3_direction_2_end, keep=Keep.BOTH, mode=Mode.PRIVATE)
    add(cut_extrude3_direction_2_tool3.solids().sort_by_distance((4, 10, 53))[0], mode=Mode.SUBTRACT)
    # Sketch4<3> → Cut-Extrude3 direction 2 (cut, up to the picked face)
    with BuildSketch(Plane(origin=(4, 0, 0), x_dir=(0, 0, -1), z_dir=(1, 0, 0)), mode=Mode.PRIVATE) as cut_extrude3_direction_2_sk4:
        with Locations((-73, 10)):
            Circle(SKETCH4_3_R)
    cut_extrude3_direction_2_tool4 = split(extrude(cut_extrude3_direction_2_sk4.sketch, amount=CUT_EXTRUDE3_DIRECTION_2_REACH, mode=Mode.PRIVATE), bisect_by=cut_extrude3_direction_2_end, keep=Keep.BOTH, mode=Mode.PRIVATE)
    add(cut_extrude3_direction_2_tool4.solids().sort_by_distance((4, 10, 73))[0], mode=Mode.SUBTRACT)
    # Sketch4<3> → Cut-Extrude3 direction 2 (cut, up to the picked face)
    with BuildSketch(Plane(origin=(4, 0, 0), x_dir=(0, 0, -1), z_dir=(1, 0, 0)), mode=Mode.PRIVATE) as cut_extrude3_direction_2_sk5:
        with Locations((-90, 10)):
            Circle(SKETCH4_3_R_2)
    cut_extrude3_direction_2_tool5 = split(extrude(cut_extrude3_direction_2_sk5.sketch, amount=CUT_EXTRUDE3_DIRECTION_2_REACH, mode=Mode.PRIVATE), bisect_by=cut_extrude3_direction_2_end, keep=Keep.BOTH, mode=Mode.PRIVATE)
    add(cut_extrude3_direction_2_tool5.solids().sort_by_distance((4, 10, 90))[0], mode=Mode.SUBTRACT)

    # Mirror1: Boss-Extrude3 across plane
    add(boss_extrude3.mirror(Plane(origin=(0, 0, 0), x_dir=(0, 0, 1), z_dir=(0.707106781, 0.707106781, 0))))

    # Sketch5 → Cut-Extrude4 (cut)
    with BuildSketch(Plane.XZ.offset(10)):
        with Locations((-10, 13)):
            Circle(SKETCH5_R)
        with Locations((-10, 90)):
            Circle(SKETCH5_R_2)
        with Locations((-10, 33)):
            Circle(SKETCH5_R)
        with Locations((-10, 53)):
            Circle(SKETCH5_R)
        with Locations((-10, 73)):
            Circle(SKETCH5_R)
    extrude(amount=-CUT_EXTRUDE4_DEPTH, mode=Mode.SUBTRACT)


solid = part.part
